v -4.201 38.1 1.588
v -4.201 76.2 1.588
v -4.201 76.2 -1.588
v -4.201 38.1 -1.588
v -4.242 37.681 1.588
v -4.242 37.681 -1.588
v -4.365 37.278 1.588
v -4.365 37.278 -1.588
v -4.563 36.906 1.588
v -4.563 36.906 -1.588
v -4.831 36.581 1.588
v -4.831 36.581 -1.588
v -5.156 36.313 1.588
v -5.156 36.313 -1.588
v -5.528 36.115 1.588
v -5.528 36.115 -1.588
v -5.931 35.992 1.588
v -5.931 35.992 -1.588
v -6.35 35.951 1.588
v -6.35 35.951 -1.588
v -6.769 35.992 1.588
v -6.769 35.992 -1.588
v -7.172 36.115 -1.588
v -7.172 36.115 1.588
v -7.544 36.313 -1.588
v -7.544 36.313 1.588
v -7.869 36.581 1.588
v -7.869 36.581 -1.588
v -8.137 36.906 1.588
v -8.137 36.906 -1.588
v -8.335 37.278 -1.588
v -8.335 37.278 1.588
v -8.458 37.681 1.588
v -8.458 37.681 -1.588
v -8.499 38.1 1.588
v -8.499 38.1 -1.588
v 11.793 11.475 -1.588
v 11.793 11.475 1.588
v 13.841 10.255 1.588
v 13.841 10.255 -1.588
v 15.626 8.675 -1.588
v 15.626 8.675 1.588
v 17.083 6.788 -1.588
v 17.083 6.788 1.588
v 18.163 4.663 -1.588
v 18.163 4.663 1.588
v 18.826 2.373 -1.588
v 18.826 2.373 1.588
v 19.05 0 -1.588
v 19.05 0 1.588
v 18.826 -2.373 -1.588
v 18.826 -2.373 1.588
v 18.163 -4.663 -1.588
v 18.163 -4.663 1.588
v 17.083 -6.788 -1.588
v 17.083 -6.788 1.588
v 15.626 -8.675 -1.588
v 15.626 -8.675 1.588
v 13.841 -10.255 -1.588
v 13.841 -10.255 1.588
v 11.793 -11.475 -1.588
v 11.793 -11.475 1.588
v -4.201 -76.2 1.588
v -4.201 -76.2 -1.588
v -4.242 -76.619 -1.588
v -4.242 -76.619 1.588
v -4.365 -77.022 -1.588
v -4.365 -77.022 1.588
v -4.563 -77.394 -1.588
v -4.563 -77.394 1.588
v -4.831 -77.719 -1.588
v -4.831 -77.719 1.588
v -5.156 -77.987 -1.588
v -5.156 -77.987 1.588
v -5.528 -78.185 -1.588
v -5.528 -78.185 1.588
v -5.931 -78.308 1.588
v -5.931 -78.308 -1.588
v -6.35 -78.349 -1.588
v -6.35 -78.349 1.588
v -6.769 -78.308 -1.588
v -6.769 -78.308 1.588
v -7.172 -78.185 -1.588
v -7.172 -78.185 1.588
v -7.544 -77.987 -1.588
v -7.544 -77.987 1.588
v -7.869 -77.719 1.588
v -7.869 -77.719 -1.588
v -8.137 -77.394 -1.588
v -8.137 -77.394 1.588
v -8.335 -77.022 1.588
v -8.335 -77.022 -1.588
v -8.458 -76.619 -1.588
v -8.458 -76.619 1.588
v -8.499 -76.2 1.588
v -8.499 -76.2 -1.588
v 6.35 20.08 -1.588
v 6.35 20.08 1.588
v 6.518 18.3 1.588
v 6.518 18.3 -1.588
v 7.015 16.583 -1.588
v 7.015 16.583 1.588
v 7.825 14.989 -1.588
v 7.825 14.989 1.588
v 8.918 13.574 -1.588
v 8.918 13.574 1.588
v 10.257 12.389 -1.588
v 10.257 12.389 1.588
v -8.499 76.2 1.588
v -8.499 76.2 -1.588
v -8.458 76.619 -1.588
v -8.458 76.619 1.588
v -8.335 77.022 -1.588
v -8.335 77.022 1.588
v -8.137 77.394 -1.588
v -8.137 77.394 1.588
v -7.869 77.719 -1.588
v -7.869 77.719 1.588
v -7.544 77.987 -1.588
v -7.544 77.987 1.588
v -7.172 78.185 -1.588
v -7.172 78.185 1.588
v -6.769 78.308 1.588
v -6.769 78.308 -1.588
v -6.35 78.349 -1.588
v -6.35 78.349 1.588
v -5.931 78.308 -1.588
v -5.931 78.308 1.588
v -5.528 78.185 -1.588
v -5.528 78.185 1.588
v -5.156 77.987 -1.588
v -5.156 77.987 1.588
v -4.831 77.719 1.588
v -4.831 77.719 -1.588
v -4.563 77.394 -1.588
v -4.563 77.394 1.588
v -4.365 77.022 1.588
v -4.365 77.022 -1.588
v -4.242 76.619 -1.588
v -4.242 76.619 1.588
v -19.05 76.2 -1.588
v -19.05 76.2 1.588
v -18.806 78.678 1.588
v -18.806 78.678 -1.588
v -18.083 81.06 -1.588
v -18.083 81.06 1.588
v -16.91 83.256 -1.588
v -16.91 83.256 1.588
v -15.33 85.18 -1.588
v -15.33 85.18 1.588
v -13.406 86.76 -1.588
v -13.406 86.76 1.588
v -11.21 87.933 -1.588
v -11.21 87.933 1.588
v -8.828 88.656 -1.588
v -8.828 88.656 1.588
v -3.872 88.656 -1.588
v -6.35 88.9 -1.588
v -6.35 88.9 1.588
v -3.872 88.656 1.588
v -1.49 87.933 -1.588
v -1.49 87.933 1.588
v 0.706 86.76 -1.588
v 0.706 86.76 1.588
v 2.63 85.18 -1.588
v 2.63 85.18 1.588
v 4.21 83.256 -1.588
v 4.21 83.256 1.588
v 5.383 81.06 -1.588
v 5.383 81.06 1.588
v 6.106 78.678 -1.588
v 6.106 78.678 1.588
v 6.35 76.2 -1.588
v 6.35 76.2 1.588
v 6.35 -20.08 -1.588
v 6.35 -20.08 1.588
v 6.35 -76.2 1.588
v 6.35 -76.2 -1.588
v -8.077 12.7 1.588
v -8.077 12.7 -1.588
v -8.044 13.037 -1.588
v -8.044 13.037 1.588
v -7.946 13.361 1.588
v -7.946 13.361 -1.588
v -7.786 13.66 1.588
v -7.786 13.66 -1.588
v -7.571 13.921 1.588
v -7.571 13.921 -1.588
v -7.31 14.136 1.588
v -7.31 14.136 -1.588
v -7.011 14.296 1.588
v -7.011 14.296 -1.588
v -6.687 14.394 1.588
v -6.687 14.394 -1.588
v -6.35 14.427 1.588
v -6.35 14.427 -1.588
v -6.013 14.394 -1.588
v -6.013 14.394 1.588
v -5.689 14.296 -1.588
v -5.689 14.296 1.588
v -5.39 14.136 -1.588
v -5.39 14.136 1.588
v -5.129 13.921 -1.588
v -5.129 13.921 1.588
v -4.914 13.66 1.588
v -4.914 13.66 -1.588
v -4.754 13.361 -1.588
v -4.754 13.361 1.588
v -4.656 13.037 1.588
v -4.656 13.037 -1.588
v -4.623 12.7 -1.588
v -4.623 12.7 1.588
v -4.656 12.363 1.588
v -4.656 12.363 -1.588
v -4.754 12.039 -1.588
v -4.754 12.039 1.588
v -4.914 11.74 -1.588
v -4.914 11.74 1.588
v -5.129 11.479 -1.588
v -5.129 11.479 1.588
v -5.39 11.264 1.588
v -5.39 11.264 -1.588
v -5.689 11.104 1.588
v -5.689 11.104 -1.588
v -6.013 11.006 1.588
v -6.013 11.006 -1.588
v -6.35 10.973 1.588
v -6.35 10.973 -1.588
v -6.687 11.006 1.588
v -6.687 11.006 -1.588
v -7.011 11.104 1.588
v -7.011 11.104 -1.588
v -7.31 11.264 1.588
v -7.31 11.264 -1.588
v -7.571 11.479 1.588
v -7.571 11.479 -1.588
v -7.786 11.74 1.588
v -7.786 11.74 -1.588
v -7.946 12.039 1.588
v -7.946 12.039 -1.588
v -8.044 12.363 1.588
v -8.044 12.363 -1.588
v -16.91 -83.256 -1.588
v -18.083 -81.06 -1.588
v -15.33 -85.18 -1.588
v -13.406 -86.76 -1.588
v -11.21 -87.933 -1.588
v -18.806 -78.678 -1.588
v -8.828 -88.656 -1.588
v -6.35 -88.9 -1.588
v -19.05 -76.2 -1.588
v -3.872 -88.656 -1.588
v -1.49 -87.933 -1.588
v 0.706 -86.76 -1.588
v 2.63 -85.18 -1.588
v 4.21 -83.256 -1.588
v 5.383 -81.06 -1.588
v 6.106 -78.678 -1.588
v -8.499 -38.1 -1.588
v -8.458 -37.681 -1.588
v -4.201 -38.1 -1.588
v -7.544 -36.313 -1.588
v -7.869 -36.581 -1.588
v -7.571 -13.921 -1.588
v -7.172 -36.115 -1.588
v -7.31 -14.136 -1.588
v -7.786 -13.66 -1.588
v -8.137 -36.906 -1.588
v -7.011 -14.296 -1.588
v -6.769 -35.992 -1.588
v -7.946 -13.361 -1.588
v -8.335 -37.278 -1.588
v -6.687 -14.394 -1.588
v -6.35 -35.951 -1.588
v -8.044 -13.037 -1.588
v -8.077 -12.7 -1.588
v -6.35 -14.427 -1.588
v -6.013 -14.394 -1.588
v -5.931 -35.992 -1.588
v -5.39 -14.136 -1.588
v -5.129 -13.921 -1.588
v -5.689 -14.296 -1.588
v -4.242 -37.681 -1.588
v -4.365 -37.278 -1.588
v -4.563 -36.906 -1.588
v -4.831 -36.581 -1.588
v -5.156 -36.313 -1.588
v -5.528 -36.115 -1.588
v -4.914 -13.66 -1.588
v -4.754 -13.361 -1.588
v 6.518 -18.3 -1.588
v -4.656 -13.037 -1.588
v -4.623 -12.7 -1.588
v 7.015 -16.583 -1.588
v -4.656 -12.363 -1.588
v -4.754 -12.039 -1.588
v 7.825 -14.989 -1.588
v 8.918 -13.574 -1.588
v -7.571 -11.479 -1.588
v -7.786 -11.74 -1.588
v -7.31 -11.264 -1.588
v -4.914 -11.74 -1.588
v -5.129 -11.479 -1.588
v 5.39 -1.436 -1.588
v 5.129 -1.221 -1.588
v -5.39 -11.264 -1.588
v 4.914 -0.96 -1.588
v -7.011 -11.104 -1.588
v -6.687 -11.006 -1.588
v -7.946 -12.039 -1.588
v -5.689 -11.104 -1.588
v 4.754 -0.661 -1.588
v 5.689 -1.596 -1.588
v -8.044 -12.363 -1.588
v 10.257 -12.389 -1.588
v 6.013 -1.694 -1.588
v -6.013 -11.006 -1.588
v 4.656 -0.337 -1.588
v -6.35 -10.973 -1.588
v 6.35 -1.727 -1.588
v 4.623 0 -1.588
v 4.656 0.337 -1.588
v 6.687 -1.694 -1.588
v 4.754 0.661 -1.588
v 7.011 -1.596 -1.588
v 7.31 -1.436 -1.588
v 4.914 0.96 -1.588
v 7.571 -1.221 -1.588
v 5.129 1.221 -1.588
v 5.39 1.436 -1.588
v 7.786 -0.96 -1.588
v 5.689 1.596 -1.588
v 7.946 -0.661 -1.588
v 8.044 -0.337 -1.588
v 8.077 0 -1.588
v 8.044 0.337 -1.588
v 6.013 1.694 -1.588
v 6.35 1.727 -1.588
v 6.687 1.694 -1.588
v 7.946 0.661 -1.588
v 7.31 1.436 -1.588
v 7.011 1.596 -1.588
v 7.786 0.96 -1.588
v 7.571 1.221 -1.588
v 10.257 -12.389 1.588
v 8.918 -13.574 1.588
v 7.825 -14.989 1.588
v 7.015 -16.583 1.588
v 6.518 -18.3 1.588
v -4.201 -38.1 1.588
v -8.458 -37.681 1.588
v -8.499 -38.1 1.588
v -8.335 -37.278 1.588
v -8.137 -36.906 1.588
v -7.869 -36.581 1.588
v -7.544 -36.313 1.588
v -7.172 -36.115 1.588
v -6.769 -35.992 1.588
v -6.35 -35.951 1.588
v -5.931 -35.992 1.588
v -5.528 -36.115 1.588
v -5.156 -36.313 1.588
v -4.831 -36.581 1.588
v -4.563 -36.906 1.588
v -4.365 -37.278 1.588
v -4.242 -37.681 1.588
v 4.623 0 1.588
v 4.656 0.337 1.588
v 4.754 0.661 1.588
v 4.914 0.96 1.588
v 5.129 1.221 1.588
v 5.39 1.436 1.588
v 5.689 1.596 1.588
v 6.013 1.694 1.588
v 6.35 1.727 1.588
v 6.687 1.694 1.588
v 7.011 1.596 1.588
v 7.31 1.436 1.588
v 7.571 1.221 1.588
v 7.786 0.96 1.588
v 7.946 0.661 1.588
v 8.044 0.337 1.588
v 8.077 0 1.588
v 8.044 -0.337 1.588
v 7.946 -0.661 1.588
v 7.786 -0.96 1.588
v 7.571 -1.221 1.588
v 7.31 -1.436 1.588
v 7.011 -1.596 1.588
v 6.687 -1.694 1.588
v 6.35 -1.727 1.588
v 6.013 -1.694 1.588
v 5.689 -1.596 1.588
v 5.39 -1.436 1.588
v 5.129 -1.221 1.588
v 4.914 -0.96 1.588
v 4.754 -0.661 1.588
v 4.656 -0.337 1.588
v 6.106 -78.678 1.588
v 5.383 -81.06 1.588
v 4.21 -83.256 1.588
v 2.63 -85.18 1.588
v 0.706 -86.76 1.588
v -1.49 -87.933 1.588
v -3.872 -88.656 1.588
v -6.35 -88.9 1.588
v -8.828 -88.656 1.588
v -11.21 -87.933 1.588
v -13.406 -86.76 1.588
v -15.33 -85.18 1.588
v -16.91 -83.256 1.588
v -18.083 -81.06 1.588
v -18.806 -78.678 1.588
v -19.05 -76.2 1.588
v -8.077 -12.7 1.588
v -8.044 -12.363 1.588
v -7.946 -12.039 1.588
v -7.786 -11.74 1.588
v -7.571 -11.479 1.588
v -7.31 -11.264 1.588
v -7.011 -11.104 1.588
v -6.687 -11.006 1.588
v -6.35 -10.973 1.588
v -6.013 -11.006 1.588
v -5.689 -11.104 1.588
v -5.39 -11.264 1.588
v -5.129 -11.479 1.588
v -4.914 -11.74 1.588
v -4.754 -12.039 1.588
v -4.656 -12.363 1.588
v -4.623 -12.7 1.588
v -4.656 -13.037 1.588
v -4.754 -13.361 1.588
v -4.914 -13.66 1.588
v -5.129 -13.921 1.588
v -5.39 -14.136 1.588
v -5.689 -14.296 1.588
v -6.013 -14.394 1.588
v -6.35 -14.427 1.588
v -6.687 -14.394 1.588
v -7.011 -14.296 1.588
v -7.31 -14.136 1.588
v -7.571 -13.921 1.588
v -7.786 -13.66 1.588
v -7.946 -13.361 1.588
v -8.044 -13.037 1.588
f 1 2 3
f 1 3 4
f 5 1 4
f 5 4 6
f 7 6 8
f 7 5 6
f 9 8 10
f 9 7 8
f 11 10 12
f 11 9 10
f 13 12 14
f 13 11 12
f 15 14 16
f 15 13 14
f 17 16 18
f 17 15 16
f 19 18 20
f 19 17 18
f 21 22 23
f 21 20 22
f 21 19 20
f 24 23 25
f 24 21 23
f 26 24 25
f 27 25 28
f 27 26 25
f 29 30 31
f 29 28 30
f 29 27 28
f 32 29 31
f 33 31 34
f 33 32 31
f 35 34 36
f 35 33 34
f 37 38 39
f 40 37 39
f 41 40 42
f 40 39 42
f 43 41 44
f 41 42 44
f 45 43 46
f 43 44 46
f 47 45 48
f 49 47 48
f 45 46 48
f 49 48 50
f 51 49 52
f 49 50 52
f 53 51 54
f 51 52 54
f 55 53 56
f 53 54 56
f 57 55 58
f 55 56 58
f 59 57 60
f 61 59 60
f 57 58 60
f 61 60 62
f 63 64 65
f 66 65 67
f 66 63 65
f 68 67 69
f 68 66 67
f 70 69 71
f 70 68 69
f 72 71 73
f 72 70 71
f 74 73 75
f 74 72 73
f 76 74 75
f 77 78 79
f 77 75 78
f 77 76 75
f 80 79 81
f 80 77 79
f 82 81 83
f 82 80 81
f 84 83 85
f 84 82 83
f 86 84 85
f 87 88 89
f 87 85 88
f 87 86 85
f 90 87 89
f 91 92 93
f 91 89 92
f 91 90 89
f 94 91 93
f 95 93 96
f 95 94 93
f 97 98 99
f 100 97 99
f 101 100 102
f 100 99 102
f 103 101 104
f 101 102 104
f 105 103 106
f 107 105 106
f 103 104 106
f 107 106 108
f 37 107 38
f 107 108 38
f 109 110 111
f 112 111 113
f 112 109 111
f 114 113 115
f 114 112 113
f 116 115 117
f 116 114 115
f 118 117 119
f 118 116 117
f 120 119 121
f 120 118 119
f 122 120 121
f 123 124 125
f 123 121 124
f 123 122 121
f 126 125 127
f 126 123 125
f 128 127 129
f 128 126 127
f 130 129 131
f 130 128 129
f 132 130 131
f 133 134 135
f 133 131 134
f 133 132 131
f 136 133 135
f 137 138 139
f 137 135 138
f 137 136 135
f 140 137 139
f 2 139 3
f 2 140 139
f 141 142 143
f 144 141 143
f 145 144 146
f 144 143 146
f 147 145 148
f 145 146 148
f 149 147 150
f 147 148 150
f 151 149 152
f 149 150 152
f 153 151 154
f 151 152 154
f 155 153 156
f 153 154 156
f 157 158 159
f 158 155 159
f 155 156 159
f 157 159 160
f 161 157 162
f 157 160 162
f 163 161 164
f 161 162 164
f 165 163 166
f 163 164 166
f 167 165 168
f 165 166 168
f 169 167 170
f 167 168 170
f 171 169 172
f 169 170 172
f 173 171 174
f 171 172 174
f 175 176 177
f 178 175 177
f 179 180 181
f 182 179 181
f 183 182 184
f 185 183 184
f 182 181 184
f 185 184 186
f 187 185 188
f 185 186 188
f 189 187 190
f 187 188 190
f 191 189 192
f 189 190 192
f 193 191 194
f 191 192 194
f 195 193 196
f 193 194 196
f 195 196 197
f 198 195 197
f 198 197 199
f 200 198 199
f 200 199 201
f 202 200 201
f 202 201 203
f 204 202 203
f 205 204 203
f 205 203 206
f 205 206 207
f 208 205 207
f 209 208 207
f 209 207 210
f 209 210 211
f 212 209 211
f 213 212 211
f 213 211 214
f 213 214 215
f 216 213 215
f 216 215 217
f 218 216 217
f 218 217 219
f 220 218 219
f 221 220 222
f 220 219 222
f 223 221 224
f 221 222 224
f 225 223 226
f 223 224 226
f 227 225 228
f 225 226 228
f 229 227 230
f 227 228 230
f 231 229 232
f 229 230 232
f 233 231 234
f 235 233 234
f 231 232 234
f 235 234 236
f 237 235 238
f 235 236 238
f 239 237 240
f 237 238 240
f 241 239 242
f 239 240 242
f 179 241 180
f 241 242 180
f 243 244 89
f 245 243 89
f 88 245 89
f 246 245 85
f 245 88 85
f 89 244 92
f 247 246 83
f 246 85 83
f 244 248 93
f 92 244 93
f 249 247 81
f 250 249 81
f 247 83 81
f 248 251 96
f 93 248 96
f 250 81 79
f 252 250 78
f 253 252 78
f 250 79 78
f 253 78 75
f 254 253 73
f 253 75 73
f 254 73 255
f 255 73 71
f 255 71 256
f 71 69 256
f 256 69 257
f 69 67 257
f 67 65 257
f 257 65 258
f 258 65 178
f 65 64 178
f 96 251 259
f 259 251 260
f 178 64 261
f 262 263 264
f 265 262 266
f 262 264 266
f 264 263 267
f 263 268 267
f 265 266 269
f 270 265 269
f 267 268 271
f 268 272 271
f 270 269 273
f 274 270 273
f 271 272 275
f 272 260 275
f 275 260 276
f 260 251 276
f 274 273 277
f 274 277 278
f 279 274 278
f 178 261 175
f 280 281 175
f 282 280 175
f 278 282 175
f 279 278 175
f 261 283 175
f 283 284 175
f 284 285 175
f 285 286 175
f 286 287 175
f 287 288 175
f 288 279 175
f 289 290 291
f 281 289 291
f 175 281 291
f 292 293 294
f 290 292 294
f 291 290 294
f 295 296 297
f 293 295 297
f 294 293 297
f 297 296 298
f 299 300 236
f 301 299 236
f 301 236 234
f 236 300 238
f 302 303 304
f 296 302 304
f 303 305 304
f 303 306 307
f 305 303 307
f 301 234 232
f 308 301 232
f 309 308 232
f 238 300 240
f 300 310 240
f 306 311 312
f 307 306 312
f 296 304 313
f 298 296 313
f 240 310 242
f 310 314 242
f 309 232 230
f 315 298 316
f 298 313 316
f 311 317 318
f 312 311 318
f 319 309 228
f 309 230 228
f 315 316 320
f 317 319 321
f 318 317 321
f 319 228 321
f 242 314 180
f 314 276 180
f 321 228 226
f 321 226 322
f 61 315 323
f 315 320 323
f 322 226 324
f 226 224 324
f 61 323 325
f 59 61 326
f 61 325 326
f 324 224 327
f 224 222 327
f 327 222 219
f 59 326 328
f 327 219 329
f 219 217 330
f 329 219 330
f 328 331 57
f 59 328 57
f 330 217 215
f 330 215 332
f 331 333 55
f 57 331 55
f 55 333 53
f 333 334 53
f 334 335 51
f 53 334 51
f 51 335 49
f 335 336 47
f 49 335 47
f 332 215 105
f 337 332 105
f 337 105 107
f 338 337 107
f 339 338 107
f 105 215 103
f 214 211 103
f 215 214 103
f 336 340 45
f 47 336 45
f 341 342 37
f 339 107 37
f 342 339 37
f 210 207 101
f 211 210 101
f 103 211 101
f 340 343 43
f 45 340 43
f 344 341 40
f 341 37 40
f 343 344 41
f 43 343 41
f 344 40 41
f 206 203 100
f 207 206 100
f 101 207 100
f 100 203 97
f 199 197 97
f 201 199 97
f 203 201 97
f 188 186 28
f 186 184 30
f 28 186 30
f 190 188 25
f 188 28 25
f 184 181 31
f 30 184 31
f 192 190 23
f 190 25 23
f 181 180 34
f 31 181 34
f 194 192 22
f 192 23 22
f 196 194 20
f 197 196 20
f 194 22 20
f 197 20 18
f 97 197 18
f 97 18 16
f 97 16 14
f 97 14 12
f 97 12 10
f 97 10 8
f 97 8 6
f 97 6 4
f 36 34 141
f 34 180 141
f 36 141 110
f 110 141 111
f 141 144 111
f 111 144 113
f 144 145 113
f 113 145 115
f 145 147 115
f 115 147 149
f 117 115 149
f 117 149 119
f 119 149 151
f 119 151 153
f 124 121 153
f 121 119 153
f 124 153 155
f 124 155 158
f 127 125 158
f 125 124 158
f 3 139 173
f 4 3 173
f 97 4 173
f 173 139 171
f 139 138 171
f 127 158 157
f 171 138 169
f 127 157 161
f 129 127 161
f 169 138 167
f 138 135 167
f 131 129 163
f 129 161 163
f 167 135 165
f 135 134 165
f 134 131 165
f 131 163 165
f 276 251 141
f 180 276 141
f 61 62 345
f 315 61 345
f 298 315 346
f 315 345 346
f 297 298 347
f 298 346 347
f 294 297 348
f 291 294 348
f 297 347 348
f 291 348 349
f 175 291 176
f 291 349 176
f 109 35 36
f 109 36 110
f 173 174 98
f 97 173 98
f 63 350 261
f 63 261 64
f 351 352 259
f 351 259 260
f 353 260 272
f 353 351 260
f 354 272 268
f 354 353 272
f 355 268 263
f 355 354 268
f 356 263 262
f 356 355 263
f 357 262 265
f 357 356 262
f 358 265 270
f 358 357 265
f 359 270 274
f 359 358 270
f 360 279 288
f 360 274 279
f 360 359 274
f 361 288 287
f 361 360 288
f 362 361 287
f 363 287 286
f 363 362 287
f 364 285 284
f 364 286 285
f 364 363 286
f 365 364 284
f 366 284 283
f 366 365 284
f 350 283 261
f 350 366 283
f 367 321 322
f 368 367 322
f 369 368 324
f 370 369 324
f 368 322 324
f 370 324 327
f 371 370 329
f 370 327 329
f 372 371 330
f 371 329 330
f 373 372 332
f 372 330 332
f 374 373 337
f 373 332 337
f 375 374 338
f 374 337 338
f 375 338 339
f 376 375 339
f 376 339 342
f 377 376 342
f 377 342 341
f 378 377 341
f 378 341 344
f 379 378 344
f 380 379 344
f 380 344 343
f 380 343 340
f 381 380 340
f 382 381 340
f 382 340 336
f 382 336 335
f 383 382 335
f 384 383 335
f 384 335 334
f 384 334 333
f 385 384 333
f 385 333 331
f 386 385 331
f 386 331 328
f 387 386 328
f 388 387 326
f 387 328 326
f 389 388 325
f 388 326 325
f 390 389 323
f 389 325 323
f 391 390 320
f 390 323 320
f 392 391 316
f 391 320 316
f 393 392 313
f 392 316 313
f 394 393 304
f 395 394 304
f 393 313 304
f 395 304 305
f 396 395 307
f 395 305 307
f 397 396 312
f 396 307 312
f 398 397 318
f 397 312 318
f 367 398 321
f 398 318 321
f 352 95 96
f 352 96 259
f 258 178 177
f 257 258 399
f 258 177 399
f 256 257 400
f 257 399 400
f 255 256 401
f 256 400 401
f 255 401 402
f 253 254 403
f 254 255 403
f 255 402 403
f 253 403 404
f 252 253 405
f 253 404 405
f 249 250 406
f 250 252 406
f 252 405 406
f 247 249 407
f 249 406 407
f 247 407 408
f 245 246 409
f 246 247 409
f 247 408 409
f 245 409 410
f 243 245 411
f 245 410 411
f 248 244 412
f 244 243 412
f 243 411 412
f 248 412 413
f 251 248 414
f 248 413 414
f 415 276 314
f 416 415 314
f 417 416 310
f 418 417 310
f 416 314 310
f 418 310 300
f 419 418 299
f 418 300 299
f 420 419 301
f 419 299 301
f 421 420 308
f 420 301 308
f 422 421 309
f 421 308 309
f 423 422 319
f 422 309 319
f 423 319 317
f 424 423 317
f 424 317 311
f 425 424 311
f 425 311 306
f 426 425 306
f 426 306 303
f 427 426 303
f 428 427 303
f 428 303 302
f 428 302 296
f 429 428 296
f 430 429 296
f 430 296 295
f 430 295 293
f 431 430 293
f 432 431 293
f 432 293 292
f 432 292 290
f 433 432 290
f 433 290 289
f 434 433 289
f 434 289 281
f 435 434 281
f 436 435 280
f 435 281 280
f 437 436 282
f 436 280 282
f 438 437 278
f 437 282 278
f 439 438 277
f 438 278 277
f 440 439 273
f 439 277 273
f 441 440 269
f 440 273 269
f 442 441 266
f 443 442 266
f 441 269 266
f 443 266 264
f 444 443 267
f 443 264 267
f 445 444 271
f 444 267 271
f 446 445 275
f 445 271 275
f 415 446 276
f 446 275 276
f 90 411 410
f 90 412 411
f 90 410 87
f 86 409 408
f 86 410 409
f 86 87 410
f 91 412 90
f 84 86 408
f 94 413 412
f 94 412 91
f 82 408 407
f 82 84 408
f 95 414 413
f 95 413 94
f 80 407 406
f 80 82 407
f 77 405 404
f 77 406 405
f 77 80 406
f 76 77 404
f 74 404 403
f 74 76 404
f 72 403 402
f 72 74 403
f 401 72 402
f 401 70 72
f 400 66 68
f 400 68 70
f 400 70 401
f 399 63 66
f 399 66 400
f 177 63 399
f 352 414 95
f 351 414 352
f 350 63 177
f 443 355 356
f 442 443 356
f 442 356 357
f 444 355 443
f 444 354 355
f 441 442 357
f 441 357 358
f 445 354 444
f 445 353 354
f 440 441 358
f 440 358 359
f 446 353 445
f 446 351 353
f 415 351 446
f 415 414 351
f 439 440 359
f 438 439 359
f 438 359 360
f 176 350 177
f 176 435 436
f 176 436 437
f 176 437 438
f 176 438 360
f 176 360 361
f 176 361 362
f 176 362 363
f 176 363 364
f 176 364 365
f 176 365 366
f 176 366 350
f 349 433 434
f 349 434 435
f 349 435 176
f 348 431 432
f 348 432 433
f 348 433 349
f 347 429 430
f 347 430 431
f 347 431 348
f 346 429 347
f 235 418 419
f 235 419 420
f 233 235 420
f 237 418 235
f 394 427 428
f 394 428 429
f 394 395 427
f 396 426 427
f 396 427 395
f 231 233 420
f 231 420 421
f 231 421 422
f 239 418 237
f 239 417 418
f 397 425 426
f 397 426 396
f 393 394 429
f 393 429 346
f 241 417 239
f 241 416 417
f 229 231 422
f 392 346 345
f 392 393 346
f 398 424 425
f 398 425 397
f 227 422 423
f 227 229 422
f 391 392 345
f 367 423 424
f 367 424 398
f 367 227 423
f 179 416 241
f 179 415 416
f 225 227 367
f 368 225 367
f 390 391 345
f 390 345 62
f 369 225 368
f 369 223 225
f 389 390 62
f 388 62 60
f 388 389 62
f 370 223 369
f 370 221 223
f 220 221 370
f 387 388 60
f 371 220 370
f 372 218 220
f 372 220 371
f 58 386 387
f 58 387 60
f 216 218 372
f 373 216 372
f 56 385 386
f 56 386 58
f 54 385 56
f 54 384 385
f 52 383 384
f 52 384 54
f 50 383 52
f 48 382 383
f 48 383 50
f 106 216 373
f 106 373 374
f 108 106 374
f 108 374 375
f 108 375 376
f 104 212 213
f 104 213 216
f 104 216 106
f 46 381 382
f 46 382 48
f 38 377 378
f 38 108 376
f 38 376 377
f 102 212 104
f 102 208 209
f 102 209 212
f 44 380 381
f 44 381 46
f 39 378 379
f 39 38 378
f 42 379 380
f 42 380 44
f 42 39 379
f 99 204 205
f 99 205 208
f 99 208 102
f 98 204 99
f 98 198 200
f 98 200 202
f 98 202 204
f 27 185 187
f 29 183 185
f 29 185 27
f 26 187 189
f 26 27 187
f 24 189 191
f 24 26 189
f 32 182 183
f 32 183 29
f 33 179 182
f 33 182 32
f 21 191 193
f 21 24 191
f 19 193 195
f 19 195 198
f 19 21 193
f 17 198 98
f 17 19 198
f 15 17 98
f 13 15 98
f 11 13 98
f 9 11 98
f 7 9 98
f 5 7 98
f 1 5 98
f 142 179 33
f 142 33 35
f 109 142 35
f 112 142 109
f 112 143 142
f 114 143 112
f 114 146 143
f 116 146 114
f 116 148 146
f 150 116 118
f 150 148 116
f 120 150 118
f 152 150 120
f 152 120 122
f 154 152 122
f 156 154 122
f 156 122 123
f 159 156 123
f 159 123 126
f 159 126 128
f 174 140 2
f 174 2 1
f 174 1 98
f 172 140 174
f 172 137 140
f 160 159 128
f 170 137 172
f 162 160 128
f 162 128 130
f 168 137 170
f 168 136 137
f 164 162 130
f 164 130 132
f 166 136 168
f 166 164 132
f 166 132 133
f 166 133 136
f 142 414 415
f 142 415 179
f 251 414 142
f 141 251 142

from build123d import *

# Parameters (mm, degrees)
SKETCH1_W             = 38.1
SKETCH1_H             = 177.8
BOSS_EXTRUDE1_DEPTH   = 1.5875
F_8_32_TAPPED_HOLE1_D = 3.4544
CUT_EXTRUDE1_DEPTH    = 91.973584765
SKETCH5_OUTSIDE_W     = 76.472
SKETCH5_OUTSIDE_H     = 216.172
CUT_EXTRUDE2_DEPTH    = 91.973584765


with BuildPart() as part:
    # Sketch1 → Boss-Extrude1 (new, symmetric)
    with BuildSketch(Plane.XY):
        Rectangle(SKETCH1_W, SKETCH1_H)
    extrude(amount=BOSS_EXTRUDE1_DEPTH, both=True)

    # #8-32 Tapped Hole1 (through all)
    with Locations(Plane.XY.offset(1.5875)):
        with Locations((-6.35, 12.7), (-6.35, -12.7), (6.35, 0)):
            Hole(F_8_32_TAPPED_HOLE1_D / 2)

    # Sketch4 → Cut-Extrude1 (cut, through all)
    with BuildSketch(Plane.XY.offset(1.5875)):
        with BuildLine():
            Line((-4.20116, 76.2), (-4.20116, 38.1))
            ThreePointArc((-4.20116, 38.1), (-6.35, 35.95116), (-8.49884, 38.1))
            Line((-8.49884, 38.1), (-8.49884, 76.2))
            ThreePointArc((-8.49884, 76.2), (-6.35, 78.34884), (-4.20116, 76.2))
        make_face()
        with BuildLine():
            Line((-4.20116, -38.1), (-4.20116, -76.2))
            ThreePointArc((-4.20116, -76.2), (-6.35, -78.34884), (-8.49884, -76.2))
            Line((-8.49884, -76.2), (-8.49884, -38.1))
            ThreePointArc((-8.49884, -38.1), (-6.35, -35.95116), (-4.20116, -38.1))
        make_face()
    extrude(amount=-CUT_EXTRUDE1_DEPTH, mode=Mode.SUBTRACT)

    # Sketch5 outside → Cut-Extrude2 (cut, through all)
    with BuildSketch(Plane.XY.offset(1.5875)):
        Rectangle(SKETCH5_OUTSIDE_W, SKETCH5_OUTSIDE_H)
        with BuildLine():
            Line((6.35, 76.2), (6.35, 20.080463142))
            ThreePointArc((6.35, 20.080463142), (7.824905724, 14.989136484), (11.792857143, 11.474550367))
            ThreePointArc((11.792857143, 11.474550367), (19.05, 0), (11.792857143, -11.474550367))
            ThreePointArc((11.792857143, -11.474550367), (7.824905724, -14.989136484), (6.35, -20.080463142))
            Line((6.35, -20.080463142), (6.35, -76.2))
            ThreePointArc((6.35, -76.2), (-6.35, -88.9), (-19.05, -76.2))
            Line((-19.05, -76.2), (-19.05, 76.2))
            ThreePointArc((-19.05, 76.2), (-6.35, 88.9), (6.35, 76.2))
        make_face(mode=Mode.SUBTRACT)
    extrude(amount=-CUT_EXTRUDE2_DEPTH, mode=Mode.SUBTRACT)


solid = part.part
